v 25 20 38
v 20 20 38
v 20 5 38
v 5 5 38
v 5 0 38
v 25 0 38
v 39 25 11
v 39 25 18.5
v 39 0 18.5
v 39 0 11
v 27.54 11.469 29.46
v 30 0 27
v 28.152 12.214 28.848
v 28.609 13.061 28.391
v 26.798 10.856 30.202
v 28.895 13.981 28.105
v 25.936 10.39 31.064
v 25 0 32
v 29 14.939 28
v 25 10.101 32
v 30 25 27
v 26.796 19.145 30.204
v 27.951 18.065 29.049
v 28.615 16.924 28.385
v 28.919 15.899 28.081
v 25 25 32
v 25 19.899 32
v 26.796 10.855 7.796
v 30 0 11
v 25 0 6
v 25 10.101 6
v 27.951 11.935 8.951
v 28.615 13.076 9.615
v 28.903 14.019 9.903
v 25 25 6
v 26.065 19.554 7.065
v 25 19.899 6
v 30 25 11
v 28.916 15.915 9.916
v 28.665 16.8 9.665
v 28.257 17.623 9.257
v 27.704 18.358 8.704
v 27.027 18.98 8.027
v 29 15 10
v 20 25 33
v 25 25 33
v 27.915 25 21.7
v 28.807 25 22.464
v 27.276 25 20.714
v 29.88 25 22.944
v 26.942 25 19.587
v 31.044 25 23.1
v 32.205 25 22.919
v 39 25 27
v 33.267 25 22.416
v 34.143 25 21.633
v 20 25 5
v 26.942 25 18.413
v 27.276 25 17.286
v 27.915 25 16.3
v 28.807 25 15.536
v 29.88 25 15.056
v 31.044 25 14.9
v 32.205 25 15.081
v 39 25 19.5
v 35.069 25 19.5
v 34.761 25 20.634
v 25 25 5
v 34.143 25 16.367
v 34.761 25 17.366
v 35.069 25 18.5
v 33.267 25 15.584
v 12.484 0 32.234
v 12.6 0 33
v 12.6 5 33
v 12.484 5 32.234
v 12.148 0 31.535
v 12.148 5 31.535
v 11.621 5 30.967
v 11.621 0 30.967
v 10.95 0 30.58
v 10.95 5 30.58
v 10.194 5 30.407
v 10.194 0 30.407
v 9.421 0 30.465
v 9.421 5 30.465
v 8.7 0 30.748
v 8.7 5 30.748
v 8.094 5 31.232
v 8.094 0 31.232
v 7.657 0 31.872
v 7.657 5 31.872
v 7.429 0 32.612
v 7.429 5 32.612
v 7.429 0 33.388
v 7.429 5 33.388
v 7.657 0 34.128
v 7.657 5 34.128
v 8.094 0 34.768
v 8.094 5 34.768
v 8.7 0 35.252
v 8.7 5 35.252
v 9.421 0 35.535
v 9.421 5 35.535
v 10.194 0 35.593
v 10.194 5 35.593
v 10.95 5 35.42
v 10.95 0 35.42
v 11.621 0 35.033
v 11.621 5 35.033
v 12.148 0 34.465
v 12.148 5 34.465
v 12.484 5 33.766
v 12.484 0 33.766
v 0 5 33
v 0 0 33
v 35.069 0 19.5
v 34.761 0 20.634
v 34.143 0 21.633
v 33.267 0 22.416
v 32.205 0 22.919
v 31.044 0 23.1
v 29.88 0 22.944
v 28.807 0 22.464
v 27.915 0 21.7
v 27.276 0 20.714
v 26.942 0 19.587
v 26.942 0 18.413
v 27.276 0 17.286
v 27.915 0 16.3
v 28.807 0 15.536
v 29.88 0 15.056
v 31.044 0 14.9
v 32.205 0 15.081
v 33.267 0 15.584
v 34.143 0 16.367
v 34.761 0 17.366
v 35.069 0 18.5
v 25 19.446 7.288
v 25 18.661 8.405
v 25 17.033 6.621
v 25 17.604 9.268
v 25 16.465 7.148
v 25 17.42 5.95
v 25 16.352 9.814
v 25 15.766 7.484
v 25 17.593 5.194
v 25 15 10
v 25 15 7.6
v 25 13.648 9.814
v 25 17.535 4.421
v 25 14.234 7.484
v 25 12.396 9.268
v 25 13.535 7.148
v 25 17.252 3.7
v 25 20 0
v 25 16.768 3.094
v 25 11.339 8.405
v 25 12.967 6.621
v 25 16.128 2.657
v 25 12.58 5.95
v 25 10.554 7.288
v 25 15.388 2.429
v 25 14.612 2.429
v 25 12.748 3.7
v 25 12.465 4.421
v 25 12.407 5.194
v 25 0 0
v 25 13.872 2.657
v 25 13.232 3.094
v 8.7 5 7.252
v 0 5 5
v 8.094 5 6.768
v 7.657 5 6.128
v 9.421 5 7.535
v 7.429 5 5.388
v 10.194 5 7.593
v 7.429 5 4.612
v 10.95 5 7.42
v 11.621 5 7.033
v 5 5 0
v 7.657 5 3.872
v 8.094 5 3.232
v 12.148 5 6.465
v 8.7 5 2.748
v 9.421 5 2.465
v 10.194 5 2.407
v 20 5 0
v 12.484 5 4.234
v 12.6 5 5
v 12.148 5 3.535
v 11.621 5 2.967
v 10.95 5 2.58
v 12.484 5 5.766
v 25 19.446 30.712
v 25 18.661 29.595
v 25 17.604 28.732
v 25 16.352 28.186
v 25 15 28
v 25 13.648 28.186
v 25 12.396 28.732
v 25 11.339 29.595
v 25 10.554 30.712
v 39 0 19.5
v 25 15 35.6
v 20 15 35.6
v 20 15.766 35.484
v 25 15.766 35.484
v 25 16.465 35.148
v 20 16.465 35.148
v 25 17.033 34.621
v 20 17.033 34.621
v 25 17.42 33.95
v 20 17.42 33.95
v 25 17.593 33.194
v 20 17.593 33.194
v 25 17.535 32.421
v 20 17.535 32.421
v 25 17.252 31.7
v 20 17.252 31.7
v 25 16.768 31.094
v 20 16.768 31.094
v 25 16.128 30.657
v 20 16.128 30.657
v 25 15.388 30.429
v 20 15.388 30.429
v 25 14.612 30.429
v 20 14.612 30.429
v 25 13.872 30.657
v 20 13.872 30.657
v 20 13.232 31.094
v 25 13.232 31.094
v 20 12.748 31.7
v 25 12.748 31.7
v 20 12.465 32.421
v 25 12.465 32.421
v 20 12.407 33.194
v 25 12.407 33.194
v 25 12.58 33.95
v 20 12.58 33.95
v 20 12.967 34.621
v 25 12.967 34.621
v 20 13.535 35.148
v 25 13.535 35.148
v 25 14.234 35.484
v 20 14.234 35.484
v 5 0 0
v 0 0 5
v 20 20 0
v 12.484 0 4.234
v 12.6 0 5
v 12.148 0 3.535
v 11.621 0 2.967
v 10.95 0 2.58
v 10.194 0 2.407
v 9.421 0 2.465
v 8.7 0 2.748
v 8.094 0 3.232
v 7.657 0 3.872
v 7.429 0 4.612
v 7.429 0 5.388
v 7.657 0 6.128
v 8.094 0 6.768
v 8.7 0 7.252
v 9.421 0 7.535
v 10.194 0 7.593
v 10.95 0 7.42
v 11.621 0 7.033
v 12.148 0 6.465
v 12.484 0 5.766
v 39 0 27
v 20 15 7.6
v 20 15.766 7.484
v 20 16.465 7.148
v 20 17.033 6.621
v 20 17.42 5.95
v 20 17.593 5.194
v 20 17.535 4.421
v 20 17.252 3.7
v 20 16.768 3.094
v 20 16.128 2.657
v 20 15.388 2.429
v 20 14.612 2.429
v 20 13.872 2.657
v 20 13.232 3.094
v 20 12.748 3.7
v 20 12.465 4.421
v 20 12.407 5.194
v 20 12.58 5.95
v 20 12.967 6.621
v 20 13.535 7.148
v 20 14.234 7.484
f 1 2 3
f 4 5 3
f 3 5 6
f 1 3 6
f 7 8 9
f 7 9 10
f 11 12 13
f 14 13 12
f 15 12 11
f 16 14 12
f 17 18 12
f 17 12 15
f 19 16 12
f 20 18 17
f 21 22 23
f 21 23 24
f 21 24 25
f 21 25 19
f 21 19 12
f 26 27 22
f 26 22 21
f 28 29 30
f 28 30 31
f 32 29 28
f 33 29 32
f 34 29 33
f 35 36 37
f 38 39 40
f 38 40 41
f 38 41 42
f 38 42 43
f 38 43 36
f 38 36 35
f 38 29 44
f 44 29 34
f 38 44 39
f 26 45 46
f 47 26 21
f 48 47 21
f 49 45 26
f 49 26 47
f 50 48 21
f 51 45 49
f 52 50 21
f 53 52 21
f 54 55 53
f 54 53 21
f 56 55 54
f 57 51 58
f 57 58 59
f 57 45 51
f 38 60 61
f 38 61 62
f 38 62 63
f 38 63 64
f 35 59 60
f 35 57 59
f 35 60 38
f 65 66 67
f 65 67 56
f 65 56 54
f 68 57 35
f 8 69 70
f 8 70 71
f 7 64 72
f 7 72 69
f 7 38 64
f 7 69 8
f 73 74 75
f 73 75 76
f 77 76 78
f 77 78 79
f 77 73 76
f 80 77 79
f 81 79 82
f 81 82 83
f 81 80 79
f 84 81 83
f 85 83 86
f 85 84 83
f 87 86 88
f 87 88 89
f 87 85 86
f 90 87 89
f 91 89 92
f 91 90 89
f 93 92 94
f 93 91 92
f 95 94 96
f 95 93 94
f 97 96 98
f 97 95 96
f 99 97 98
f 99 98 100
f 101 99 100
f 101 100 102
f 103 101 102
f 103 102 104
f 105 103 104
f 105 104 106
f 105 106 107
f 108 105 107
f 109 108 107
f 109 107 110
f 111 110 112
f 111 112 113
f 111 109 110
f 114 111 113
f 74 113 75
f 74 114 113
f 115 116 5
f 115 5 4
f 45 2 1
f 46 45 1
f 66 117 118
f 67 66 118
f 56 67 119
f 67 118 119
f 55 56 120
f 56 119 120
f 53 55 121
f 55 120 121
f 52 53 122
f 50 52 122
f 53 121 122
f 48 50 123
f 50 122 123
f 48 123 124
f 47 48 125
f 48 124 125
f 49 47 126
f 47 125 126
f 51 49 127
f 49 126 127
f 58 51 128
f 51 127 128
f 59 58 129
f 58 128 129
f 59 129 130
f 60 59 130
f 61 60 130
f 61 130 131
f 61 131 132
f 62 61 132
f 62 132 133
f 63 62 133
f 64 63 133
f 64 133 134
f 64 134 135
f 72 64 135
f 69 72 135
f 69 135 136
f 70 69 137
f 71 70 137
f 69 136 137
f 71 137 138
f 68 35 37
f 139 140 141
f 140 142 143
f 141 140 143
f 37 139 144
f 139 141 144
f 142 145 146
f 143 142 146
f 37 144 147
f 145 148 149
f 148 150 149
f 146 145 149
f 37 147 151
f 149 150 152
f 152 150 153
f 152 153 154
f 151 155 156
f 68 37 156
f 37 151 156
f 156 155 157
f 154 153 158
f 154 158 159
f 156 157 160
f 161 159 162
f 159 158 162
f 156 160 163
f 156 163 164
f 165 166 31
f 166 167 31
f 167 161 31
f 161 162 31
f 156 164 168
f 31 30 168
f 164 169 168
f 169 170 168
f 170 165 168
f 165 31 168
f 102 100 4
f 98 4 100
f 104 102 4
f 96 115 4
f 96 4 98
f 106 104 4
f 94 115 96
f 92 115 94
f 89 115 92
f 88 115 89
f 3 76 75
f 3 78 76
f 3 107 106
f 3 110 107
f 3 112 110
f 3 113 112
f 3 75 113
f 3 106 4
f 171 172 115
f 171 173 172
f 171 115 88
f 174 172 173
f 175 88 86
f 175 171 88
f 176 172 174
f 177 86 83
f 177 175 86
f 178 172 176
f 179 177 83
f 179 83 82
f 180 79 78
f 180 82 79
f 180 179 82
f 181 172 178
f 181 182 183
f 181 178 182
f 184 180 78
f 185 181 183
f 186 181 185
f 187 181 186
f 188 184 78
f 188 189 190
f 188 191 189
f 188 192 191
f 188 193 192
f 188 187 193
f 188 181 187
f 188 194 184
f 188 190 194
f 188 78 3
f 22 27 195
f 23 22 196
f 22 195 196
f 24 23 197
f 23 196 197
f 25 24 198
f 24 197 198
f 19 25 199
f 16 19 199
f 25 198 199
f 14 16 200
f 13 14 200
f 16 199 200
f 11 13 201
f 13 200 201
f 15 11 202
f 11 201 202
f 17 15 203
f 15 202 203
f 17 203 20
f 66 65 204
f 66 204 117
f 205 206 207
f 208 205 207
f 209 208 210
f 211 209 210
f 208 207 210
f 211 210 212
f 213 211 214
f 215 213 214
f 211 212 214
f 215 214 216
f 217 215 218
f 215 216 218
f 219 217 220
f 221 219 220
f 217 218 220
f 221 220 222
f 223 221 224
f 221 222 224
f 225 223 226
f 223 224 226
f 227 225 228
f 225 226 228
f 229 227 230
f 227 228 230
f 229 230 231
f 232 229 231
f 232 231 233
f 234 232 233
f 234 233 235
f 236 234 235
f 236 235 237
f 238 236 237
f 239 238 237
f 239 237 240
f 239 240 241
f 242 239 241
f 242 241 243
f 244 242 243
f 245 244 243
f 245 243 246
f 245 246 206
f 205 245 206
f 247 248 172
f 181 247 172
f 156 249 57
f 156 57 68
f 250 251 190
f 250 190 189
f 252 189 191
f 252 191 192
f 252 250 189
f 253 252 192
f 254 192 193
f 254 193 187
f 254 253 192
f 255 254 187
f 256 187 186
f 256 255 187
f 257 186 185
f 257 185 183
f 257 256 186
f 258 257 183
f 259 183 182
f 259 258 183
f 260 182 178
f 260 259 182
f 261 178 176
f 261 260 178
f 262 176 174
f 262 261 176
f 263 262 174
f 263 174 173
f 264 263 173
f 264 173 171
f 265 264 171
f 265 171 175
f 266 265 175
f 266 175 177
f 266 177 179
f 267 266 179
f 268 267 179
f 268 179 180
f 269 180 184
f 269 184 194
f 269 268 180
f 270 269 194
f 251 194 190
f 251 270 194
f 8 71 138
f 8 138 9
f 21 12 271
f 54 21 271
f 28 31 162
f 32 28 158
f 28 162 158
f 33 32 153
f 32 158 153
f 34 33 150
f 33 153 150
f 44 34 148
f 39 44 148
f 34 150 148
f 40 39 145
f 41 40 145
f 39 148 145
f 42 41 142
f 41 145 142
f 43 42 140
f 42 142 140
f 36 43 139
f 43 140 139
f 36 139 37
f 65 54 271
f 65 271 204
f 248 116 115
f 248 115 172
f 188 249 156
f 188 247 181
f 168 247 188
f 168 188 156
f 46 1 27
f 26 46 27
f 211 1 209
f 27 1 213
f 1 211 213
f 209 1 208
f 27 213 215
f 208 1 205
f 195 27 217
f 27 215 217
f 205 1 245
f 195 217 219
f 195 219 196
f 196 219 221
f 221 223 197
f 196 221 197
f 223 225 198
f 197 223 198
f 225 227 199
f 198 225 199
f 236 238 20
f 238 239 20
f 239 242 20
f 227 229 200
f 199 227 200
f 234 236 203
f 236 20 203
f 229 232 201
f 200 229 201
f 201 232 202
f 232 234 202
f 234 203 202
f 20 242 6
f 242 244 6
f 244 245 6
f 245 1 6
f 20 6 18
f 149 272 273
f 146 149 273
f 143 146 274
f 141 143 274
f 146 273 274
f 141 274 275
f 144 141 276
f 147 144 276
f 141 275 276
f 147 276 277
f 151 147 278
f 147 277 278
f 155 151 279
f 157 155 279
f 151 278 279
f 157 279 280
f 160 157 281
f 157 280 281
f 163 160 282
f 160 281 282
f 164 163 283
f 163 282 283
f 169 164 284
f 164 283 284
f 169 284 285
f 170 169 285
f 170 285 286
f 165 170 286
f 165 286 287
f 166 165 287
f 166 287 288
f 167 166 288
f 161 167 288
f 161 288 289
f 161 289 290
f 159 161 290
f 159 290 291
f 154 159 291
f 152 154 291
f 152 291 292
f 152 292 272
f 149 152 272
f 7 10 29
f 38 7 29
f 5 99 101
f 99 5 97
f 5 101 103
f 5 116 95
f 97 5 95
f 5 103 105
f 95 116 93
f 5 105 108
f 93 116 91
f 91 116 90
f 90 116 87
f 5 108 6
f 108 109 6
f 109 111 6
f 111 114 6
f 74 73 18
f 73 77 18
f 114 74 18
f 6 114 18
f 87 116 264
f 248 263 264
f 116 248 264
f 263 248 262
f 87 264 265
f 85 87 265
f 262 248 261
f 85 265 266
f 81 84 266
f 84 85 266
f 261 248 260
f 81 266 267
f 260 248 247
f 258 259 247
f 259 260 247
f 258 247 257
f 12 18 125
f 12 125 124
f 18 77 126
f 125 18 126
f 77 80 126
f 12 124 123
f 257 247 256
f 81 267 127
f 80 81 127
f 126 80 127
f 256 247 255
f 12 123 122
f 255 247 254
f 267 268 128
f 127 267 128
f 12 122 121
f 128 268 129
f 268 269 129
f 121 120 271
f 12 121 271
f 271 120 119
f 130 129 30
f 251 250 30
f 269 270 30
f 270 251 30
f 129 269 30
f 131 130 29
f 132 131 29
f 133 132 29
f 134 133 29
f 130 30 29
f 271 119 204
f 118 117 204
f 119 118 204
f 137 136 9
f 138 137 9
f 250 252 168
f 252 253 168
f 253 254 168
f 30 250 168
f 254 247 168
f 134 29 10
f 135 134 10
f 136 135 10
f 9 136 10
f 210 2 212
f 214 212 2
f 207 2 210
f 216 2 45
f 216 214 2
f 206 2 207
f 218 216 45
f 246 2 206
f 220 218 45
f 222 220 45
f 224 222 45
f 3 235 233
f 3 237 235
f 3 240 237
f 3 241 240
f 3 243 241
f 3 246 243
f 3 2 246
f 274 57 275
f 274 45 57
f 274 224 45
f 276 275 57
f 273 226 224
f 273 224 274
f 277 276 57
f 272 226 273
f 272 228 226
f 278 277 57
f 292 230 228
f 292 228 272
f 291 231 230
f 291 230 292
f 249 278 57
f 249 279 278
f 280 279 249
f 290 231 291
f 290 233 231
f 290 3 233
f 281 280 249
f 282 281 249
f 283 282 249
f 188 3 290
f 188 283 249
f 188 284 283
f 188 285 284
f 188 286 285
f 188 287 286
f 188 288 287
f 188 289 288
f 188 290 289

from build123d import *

# Parameters (mm, degrees)
SKETCH1_W           = 20
SKETCH1_H           = 38
SKETCH1_R           = 2.6
BOSS_EXTRUDE1_DEPTH = 5
BOSS_EXTRUDE2_DEPTH = 25
CHAMFER1_SIZE       = 5
SKETCH2_R           = 2.6
CUT_EXTRUDE1_DEPTH  = 50.689032995
SKETCH3_R           = 5
CUT_EXTRUDE2_DEPTH  = 52.903757089
CHAMFER2_SIZE       = 5
CHAMFER3_SIZE       = 5


with BuildPart() as part:
    # Sketch1 → Boss-Extrude1 (new body)
    with BuildSketch(Plane(origin=(0, 0, 0), x_dir=(1, 0, 0), z_dir=(0, 1, 0))):
        with Locations((10, -19)):
            Rectangle(SKETCH1_W, SKETCH1_H)
        with Locations((10, -33)):
            Circle(SKETCH1_R, mode=Mode.SUBTRACT)
        with Locations((10, -5)):
            Circle(SKETCH1_R, mode=Mode.SUBTRACT)
    extrude(amount=BOSS_EXTRUDE1_DEPTH)

    # Sketch1<4> → Boss-Extrude2 (add)
    with BuildSketch(Plane(origin=(0, 0, 0), x_dir=(1, 0, 0), z_dir=(0, 1, 0))):
        with BuildLine():
            Line((25, 0), (20, 0))
            Line((20, 0), (20, -38))
            Line((20, -38), (25, -38))
            Line((25, -38), (25, -27))
            Line((25, -27), (39, -27))
            Line((39, -27), (39, -19.5))
            Line((39, -19.5), (35.06939799, -19.5))
            ThreePointArc((35.06939799, -19.5), (26.9, -19), (35.06939799, -18.5))
            Line((35.06939799, -18.5), (39, -18.5))
            Line((39, -18.5), (39, -11))
            Line((39, -11), (25, -11))
            Line((25, -11), (25, 0))
        make_face()
    extrude(amount=BOSS_EXTRUDE2_DEPTH)

    # Chamfer1
    chamfer1_edges = [part.edges().sort_by_distance(p)[0] for p in [
        (25, 12.5, 11),
        (25, 12.5, 27),
    ]]
    chamfer(chamfer1_edges, length=CHAMFER1_SIZE)

    # Sketch2 → Cut-Extrude1 (cut, through all)
    with BuildSketch(Plane.ZY.offset(-20)):
        with Locations((5, 15)):
            Circle(SKETCH2_R)
        with Locations((33, 15)):
            Circle(SKETCH2_R)
    extrude(amount=-CUT_EXTRUDE1_DEPTH, mode=Mode.SUBTRACT)

    # Sketch3 → Cut-Extrude2 (cut, through all)
    with BuildSketch(Plane.ZY.offset(-25)):
        with Locations((5, 15)):
            Circle(SKETCH3_R)
        with Locations((33, 15)):
            Circle(SKETCH3_R)
    extrude(amount=-CUT_EXTRUDE2_DEPTH, mode=Mode.SUBTRACT)

    # Chamfer2
    chamfer2_edges = [part.edges().sort_by_distance(p)[0] for p in [
        (22.5, 25, 0),
        (22.5, 25, 38),
    ]]
    chamfer(chamfer2_edges, length=CHAMFER2_SIZE)

    # Chamfer3
    chamfer3_edges = [part.edges().sort_by_distance(p)[0] for p in [
        (0, 2.5, 0),
        (0, 2.5, 38),
    ]]
    chamfer(chamfer3_edges, length=CHAMFER3_SIZE)


solid = part.part
